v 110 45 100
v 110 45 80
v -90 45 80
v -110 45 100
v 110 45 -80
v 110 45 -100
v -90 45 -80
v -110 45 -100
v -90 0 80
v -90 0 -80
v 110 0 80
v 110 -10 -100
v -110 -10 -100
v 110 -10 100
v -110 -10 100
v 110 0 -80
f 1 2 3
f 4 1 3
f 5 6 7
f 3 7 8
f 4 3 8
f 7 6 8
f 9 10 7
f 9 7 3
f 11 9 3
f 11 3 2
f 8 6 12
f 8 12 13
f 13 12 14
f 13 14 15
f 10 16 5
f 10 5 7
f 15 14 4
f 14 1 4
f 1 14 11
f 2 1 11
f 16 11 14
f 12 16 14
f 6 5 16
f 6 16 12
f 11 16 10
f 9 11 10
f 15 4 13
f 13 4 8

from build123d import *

# Parameters (mm, degrees)
BOSS_EXTRUDE1_DEPTH = 45
SKETCH2_W           = 220
SKETCH2_H           = 200
BOSS_EXTRUDE2_DEPTH = 10


with BuildPart() as part:
    # Sketch1 → Boss-Extrude1 (new body)
    with BuildSketch(Plane(origin=(0, 0, 0), x_dir=(1, 0, 0), z_dir=(0, 1, 0))):
        Polygon((-110, -100), (-110, 100), (110, 100), (110, 80), (-90, 80), (-90, -80), (110, -80), (110, -100), align=None)
    extrude(amount=BOSS_EXTRUDE1_DEPTH)

    # Sketch2 → Boss-Extrude2 (add)
    with BuildSketch(Plane(origin=(0, 0, 0), x_dir=(-1, 0, 0), z_dir=(0, -1, 0))):
        Rectangle(SKETCH2_W, SKETCH2_H)
    extrude(amount=BOSS_EXTRUDE2_DEPTH)


solid = part.part
